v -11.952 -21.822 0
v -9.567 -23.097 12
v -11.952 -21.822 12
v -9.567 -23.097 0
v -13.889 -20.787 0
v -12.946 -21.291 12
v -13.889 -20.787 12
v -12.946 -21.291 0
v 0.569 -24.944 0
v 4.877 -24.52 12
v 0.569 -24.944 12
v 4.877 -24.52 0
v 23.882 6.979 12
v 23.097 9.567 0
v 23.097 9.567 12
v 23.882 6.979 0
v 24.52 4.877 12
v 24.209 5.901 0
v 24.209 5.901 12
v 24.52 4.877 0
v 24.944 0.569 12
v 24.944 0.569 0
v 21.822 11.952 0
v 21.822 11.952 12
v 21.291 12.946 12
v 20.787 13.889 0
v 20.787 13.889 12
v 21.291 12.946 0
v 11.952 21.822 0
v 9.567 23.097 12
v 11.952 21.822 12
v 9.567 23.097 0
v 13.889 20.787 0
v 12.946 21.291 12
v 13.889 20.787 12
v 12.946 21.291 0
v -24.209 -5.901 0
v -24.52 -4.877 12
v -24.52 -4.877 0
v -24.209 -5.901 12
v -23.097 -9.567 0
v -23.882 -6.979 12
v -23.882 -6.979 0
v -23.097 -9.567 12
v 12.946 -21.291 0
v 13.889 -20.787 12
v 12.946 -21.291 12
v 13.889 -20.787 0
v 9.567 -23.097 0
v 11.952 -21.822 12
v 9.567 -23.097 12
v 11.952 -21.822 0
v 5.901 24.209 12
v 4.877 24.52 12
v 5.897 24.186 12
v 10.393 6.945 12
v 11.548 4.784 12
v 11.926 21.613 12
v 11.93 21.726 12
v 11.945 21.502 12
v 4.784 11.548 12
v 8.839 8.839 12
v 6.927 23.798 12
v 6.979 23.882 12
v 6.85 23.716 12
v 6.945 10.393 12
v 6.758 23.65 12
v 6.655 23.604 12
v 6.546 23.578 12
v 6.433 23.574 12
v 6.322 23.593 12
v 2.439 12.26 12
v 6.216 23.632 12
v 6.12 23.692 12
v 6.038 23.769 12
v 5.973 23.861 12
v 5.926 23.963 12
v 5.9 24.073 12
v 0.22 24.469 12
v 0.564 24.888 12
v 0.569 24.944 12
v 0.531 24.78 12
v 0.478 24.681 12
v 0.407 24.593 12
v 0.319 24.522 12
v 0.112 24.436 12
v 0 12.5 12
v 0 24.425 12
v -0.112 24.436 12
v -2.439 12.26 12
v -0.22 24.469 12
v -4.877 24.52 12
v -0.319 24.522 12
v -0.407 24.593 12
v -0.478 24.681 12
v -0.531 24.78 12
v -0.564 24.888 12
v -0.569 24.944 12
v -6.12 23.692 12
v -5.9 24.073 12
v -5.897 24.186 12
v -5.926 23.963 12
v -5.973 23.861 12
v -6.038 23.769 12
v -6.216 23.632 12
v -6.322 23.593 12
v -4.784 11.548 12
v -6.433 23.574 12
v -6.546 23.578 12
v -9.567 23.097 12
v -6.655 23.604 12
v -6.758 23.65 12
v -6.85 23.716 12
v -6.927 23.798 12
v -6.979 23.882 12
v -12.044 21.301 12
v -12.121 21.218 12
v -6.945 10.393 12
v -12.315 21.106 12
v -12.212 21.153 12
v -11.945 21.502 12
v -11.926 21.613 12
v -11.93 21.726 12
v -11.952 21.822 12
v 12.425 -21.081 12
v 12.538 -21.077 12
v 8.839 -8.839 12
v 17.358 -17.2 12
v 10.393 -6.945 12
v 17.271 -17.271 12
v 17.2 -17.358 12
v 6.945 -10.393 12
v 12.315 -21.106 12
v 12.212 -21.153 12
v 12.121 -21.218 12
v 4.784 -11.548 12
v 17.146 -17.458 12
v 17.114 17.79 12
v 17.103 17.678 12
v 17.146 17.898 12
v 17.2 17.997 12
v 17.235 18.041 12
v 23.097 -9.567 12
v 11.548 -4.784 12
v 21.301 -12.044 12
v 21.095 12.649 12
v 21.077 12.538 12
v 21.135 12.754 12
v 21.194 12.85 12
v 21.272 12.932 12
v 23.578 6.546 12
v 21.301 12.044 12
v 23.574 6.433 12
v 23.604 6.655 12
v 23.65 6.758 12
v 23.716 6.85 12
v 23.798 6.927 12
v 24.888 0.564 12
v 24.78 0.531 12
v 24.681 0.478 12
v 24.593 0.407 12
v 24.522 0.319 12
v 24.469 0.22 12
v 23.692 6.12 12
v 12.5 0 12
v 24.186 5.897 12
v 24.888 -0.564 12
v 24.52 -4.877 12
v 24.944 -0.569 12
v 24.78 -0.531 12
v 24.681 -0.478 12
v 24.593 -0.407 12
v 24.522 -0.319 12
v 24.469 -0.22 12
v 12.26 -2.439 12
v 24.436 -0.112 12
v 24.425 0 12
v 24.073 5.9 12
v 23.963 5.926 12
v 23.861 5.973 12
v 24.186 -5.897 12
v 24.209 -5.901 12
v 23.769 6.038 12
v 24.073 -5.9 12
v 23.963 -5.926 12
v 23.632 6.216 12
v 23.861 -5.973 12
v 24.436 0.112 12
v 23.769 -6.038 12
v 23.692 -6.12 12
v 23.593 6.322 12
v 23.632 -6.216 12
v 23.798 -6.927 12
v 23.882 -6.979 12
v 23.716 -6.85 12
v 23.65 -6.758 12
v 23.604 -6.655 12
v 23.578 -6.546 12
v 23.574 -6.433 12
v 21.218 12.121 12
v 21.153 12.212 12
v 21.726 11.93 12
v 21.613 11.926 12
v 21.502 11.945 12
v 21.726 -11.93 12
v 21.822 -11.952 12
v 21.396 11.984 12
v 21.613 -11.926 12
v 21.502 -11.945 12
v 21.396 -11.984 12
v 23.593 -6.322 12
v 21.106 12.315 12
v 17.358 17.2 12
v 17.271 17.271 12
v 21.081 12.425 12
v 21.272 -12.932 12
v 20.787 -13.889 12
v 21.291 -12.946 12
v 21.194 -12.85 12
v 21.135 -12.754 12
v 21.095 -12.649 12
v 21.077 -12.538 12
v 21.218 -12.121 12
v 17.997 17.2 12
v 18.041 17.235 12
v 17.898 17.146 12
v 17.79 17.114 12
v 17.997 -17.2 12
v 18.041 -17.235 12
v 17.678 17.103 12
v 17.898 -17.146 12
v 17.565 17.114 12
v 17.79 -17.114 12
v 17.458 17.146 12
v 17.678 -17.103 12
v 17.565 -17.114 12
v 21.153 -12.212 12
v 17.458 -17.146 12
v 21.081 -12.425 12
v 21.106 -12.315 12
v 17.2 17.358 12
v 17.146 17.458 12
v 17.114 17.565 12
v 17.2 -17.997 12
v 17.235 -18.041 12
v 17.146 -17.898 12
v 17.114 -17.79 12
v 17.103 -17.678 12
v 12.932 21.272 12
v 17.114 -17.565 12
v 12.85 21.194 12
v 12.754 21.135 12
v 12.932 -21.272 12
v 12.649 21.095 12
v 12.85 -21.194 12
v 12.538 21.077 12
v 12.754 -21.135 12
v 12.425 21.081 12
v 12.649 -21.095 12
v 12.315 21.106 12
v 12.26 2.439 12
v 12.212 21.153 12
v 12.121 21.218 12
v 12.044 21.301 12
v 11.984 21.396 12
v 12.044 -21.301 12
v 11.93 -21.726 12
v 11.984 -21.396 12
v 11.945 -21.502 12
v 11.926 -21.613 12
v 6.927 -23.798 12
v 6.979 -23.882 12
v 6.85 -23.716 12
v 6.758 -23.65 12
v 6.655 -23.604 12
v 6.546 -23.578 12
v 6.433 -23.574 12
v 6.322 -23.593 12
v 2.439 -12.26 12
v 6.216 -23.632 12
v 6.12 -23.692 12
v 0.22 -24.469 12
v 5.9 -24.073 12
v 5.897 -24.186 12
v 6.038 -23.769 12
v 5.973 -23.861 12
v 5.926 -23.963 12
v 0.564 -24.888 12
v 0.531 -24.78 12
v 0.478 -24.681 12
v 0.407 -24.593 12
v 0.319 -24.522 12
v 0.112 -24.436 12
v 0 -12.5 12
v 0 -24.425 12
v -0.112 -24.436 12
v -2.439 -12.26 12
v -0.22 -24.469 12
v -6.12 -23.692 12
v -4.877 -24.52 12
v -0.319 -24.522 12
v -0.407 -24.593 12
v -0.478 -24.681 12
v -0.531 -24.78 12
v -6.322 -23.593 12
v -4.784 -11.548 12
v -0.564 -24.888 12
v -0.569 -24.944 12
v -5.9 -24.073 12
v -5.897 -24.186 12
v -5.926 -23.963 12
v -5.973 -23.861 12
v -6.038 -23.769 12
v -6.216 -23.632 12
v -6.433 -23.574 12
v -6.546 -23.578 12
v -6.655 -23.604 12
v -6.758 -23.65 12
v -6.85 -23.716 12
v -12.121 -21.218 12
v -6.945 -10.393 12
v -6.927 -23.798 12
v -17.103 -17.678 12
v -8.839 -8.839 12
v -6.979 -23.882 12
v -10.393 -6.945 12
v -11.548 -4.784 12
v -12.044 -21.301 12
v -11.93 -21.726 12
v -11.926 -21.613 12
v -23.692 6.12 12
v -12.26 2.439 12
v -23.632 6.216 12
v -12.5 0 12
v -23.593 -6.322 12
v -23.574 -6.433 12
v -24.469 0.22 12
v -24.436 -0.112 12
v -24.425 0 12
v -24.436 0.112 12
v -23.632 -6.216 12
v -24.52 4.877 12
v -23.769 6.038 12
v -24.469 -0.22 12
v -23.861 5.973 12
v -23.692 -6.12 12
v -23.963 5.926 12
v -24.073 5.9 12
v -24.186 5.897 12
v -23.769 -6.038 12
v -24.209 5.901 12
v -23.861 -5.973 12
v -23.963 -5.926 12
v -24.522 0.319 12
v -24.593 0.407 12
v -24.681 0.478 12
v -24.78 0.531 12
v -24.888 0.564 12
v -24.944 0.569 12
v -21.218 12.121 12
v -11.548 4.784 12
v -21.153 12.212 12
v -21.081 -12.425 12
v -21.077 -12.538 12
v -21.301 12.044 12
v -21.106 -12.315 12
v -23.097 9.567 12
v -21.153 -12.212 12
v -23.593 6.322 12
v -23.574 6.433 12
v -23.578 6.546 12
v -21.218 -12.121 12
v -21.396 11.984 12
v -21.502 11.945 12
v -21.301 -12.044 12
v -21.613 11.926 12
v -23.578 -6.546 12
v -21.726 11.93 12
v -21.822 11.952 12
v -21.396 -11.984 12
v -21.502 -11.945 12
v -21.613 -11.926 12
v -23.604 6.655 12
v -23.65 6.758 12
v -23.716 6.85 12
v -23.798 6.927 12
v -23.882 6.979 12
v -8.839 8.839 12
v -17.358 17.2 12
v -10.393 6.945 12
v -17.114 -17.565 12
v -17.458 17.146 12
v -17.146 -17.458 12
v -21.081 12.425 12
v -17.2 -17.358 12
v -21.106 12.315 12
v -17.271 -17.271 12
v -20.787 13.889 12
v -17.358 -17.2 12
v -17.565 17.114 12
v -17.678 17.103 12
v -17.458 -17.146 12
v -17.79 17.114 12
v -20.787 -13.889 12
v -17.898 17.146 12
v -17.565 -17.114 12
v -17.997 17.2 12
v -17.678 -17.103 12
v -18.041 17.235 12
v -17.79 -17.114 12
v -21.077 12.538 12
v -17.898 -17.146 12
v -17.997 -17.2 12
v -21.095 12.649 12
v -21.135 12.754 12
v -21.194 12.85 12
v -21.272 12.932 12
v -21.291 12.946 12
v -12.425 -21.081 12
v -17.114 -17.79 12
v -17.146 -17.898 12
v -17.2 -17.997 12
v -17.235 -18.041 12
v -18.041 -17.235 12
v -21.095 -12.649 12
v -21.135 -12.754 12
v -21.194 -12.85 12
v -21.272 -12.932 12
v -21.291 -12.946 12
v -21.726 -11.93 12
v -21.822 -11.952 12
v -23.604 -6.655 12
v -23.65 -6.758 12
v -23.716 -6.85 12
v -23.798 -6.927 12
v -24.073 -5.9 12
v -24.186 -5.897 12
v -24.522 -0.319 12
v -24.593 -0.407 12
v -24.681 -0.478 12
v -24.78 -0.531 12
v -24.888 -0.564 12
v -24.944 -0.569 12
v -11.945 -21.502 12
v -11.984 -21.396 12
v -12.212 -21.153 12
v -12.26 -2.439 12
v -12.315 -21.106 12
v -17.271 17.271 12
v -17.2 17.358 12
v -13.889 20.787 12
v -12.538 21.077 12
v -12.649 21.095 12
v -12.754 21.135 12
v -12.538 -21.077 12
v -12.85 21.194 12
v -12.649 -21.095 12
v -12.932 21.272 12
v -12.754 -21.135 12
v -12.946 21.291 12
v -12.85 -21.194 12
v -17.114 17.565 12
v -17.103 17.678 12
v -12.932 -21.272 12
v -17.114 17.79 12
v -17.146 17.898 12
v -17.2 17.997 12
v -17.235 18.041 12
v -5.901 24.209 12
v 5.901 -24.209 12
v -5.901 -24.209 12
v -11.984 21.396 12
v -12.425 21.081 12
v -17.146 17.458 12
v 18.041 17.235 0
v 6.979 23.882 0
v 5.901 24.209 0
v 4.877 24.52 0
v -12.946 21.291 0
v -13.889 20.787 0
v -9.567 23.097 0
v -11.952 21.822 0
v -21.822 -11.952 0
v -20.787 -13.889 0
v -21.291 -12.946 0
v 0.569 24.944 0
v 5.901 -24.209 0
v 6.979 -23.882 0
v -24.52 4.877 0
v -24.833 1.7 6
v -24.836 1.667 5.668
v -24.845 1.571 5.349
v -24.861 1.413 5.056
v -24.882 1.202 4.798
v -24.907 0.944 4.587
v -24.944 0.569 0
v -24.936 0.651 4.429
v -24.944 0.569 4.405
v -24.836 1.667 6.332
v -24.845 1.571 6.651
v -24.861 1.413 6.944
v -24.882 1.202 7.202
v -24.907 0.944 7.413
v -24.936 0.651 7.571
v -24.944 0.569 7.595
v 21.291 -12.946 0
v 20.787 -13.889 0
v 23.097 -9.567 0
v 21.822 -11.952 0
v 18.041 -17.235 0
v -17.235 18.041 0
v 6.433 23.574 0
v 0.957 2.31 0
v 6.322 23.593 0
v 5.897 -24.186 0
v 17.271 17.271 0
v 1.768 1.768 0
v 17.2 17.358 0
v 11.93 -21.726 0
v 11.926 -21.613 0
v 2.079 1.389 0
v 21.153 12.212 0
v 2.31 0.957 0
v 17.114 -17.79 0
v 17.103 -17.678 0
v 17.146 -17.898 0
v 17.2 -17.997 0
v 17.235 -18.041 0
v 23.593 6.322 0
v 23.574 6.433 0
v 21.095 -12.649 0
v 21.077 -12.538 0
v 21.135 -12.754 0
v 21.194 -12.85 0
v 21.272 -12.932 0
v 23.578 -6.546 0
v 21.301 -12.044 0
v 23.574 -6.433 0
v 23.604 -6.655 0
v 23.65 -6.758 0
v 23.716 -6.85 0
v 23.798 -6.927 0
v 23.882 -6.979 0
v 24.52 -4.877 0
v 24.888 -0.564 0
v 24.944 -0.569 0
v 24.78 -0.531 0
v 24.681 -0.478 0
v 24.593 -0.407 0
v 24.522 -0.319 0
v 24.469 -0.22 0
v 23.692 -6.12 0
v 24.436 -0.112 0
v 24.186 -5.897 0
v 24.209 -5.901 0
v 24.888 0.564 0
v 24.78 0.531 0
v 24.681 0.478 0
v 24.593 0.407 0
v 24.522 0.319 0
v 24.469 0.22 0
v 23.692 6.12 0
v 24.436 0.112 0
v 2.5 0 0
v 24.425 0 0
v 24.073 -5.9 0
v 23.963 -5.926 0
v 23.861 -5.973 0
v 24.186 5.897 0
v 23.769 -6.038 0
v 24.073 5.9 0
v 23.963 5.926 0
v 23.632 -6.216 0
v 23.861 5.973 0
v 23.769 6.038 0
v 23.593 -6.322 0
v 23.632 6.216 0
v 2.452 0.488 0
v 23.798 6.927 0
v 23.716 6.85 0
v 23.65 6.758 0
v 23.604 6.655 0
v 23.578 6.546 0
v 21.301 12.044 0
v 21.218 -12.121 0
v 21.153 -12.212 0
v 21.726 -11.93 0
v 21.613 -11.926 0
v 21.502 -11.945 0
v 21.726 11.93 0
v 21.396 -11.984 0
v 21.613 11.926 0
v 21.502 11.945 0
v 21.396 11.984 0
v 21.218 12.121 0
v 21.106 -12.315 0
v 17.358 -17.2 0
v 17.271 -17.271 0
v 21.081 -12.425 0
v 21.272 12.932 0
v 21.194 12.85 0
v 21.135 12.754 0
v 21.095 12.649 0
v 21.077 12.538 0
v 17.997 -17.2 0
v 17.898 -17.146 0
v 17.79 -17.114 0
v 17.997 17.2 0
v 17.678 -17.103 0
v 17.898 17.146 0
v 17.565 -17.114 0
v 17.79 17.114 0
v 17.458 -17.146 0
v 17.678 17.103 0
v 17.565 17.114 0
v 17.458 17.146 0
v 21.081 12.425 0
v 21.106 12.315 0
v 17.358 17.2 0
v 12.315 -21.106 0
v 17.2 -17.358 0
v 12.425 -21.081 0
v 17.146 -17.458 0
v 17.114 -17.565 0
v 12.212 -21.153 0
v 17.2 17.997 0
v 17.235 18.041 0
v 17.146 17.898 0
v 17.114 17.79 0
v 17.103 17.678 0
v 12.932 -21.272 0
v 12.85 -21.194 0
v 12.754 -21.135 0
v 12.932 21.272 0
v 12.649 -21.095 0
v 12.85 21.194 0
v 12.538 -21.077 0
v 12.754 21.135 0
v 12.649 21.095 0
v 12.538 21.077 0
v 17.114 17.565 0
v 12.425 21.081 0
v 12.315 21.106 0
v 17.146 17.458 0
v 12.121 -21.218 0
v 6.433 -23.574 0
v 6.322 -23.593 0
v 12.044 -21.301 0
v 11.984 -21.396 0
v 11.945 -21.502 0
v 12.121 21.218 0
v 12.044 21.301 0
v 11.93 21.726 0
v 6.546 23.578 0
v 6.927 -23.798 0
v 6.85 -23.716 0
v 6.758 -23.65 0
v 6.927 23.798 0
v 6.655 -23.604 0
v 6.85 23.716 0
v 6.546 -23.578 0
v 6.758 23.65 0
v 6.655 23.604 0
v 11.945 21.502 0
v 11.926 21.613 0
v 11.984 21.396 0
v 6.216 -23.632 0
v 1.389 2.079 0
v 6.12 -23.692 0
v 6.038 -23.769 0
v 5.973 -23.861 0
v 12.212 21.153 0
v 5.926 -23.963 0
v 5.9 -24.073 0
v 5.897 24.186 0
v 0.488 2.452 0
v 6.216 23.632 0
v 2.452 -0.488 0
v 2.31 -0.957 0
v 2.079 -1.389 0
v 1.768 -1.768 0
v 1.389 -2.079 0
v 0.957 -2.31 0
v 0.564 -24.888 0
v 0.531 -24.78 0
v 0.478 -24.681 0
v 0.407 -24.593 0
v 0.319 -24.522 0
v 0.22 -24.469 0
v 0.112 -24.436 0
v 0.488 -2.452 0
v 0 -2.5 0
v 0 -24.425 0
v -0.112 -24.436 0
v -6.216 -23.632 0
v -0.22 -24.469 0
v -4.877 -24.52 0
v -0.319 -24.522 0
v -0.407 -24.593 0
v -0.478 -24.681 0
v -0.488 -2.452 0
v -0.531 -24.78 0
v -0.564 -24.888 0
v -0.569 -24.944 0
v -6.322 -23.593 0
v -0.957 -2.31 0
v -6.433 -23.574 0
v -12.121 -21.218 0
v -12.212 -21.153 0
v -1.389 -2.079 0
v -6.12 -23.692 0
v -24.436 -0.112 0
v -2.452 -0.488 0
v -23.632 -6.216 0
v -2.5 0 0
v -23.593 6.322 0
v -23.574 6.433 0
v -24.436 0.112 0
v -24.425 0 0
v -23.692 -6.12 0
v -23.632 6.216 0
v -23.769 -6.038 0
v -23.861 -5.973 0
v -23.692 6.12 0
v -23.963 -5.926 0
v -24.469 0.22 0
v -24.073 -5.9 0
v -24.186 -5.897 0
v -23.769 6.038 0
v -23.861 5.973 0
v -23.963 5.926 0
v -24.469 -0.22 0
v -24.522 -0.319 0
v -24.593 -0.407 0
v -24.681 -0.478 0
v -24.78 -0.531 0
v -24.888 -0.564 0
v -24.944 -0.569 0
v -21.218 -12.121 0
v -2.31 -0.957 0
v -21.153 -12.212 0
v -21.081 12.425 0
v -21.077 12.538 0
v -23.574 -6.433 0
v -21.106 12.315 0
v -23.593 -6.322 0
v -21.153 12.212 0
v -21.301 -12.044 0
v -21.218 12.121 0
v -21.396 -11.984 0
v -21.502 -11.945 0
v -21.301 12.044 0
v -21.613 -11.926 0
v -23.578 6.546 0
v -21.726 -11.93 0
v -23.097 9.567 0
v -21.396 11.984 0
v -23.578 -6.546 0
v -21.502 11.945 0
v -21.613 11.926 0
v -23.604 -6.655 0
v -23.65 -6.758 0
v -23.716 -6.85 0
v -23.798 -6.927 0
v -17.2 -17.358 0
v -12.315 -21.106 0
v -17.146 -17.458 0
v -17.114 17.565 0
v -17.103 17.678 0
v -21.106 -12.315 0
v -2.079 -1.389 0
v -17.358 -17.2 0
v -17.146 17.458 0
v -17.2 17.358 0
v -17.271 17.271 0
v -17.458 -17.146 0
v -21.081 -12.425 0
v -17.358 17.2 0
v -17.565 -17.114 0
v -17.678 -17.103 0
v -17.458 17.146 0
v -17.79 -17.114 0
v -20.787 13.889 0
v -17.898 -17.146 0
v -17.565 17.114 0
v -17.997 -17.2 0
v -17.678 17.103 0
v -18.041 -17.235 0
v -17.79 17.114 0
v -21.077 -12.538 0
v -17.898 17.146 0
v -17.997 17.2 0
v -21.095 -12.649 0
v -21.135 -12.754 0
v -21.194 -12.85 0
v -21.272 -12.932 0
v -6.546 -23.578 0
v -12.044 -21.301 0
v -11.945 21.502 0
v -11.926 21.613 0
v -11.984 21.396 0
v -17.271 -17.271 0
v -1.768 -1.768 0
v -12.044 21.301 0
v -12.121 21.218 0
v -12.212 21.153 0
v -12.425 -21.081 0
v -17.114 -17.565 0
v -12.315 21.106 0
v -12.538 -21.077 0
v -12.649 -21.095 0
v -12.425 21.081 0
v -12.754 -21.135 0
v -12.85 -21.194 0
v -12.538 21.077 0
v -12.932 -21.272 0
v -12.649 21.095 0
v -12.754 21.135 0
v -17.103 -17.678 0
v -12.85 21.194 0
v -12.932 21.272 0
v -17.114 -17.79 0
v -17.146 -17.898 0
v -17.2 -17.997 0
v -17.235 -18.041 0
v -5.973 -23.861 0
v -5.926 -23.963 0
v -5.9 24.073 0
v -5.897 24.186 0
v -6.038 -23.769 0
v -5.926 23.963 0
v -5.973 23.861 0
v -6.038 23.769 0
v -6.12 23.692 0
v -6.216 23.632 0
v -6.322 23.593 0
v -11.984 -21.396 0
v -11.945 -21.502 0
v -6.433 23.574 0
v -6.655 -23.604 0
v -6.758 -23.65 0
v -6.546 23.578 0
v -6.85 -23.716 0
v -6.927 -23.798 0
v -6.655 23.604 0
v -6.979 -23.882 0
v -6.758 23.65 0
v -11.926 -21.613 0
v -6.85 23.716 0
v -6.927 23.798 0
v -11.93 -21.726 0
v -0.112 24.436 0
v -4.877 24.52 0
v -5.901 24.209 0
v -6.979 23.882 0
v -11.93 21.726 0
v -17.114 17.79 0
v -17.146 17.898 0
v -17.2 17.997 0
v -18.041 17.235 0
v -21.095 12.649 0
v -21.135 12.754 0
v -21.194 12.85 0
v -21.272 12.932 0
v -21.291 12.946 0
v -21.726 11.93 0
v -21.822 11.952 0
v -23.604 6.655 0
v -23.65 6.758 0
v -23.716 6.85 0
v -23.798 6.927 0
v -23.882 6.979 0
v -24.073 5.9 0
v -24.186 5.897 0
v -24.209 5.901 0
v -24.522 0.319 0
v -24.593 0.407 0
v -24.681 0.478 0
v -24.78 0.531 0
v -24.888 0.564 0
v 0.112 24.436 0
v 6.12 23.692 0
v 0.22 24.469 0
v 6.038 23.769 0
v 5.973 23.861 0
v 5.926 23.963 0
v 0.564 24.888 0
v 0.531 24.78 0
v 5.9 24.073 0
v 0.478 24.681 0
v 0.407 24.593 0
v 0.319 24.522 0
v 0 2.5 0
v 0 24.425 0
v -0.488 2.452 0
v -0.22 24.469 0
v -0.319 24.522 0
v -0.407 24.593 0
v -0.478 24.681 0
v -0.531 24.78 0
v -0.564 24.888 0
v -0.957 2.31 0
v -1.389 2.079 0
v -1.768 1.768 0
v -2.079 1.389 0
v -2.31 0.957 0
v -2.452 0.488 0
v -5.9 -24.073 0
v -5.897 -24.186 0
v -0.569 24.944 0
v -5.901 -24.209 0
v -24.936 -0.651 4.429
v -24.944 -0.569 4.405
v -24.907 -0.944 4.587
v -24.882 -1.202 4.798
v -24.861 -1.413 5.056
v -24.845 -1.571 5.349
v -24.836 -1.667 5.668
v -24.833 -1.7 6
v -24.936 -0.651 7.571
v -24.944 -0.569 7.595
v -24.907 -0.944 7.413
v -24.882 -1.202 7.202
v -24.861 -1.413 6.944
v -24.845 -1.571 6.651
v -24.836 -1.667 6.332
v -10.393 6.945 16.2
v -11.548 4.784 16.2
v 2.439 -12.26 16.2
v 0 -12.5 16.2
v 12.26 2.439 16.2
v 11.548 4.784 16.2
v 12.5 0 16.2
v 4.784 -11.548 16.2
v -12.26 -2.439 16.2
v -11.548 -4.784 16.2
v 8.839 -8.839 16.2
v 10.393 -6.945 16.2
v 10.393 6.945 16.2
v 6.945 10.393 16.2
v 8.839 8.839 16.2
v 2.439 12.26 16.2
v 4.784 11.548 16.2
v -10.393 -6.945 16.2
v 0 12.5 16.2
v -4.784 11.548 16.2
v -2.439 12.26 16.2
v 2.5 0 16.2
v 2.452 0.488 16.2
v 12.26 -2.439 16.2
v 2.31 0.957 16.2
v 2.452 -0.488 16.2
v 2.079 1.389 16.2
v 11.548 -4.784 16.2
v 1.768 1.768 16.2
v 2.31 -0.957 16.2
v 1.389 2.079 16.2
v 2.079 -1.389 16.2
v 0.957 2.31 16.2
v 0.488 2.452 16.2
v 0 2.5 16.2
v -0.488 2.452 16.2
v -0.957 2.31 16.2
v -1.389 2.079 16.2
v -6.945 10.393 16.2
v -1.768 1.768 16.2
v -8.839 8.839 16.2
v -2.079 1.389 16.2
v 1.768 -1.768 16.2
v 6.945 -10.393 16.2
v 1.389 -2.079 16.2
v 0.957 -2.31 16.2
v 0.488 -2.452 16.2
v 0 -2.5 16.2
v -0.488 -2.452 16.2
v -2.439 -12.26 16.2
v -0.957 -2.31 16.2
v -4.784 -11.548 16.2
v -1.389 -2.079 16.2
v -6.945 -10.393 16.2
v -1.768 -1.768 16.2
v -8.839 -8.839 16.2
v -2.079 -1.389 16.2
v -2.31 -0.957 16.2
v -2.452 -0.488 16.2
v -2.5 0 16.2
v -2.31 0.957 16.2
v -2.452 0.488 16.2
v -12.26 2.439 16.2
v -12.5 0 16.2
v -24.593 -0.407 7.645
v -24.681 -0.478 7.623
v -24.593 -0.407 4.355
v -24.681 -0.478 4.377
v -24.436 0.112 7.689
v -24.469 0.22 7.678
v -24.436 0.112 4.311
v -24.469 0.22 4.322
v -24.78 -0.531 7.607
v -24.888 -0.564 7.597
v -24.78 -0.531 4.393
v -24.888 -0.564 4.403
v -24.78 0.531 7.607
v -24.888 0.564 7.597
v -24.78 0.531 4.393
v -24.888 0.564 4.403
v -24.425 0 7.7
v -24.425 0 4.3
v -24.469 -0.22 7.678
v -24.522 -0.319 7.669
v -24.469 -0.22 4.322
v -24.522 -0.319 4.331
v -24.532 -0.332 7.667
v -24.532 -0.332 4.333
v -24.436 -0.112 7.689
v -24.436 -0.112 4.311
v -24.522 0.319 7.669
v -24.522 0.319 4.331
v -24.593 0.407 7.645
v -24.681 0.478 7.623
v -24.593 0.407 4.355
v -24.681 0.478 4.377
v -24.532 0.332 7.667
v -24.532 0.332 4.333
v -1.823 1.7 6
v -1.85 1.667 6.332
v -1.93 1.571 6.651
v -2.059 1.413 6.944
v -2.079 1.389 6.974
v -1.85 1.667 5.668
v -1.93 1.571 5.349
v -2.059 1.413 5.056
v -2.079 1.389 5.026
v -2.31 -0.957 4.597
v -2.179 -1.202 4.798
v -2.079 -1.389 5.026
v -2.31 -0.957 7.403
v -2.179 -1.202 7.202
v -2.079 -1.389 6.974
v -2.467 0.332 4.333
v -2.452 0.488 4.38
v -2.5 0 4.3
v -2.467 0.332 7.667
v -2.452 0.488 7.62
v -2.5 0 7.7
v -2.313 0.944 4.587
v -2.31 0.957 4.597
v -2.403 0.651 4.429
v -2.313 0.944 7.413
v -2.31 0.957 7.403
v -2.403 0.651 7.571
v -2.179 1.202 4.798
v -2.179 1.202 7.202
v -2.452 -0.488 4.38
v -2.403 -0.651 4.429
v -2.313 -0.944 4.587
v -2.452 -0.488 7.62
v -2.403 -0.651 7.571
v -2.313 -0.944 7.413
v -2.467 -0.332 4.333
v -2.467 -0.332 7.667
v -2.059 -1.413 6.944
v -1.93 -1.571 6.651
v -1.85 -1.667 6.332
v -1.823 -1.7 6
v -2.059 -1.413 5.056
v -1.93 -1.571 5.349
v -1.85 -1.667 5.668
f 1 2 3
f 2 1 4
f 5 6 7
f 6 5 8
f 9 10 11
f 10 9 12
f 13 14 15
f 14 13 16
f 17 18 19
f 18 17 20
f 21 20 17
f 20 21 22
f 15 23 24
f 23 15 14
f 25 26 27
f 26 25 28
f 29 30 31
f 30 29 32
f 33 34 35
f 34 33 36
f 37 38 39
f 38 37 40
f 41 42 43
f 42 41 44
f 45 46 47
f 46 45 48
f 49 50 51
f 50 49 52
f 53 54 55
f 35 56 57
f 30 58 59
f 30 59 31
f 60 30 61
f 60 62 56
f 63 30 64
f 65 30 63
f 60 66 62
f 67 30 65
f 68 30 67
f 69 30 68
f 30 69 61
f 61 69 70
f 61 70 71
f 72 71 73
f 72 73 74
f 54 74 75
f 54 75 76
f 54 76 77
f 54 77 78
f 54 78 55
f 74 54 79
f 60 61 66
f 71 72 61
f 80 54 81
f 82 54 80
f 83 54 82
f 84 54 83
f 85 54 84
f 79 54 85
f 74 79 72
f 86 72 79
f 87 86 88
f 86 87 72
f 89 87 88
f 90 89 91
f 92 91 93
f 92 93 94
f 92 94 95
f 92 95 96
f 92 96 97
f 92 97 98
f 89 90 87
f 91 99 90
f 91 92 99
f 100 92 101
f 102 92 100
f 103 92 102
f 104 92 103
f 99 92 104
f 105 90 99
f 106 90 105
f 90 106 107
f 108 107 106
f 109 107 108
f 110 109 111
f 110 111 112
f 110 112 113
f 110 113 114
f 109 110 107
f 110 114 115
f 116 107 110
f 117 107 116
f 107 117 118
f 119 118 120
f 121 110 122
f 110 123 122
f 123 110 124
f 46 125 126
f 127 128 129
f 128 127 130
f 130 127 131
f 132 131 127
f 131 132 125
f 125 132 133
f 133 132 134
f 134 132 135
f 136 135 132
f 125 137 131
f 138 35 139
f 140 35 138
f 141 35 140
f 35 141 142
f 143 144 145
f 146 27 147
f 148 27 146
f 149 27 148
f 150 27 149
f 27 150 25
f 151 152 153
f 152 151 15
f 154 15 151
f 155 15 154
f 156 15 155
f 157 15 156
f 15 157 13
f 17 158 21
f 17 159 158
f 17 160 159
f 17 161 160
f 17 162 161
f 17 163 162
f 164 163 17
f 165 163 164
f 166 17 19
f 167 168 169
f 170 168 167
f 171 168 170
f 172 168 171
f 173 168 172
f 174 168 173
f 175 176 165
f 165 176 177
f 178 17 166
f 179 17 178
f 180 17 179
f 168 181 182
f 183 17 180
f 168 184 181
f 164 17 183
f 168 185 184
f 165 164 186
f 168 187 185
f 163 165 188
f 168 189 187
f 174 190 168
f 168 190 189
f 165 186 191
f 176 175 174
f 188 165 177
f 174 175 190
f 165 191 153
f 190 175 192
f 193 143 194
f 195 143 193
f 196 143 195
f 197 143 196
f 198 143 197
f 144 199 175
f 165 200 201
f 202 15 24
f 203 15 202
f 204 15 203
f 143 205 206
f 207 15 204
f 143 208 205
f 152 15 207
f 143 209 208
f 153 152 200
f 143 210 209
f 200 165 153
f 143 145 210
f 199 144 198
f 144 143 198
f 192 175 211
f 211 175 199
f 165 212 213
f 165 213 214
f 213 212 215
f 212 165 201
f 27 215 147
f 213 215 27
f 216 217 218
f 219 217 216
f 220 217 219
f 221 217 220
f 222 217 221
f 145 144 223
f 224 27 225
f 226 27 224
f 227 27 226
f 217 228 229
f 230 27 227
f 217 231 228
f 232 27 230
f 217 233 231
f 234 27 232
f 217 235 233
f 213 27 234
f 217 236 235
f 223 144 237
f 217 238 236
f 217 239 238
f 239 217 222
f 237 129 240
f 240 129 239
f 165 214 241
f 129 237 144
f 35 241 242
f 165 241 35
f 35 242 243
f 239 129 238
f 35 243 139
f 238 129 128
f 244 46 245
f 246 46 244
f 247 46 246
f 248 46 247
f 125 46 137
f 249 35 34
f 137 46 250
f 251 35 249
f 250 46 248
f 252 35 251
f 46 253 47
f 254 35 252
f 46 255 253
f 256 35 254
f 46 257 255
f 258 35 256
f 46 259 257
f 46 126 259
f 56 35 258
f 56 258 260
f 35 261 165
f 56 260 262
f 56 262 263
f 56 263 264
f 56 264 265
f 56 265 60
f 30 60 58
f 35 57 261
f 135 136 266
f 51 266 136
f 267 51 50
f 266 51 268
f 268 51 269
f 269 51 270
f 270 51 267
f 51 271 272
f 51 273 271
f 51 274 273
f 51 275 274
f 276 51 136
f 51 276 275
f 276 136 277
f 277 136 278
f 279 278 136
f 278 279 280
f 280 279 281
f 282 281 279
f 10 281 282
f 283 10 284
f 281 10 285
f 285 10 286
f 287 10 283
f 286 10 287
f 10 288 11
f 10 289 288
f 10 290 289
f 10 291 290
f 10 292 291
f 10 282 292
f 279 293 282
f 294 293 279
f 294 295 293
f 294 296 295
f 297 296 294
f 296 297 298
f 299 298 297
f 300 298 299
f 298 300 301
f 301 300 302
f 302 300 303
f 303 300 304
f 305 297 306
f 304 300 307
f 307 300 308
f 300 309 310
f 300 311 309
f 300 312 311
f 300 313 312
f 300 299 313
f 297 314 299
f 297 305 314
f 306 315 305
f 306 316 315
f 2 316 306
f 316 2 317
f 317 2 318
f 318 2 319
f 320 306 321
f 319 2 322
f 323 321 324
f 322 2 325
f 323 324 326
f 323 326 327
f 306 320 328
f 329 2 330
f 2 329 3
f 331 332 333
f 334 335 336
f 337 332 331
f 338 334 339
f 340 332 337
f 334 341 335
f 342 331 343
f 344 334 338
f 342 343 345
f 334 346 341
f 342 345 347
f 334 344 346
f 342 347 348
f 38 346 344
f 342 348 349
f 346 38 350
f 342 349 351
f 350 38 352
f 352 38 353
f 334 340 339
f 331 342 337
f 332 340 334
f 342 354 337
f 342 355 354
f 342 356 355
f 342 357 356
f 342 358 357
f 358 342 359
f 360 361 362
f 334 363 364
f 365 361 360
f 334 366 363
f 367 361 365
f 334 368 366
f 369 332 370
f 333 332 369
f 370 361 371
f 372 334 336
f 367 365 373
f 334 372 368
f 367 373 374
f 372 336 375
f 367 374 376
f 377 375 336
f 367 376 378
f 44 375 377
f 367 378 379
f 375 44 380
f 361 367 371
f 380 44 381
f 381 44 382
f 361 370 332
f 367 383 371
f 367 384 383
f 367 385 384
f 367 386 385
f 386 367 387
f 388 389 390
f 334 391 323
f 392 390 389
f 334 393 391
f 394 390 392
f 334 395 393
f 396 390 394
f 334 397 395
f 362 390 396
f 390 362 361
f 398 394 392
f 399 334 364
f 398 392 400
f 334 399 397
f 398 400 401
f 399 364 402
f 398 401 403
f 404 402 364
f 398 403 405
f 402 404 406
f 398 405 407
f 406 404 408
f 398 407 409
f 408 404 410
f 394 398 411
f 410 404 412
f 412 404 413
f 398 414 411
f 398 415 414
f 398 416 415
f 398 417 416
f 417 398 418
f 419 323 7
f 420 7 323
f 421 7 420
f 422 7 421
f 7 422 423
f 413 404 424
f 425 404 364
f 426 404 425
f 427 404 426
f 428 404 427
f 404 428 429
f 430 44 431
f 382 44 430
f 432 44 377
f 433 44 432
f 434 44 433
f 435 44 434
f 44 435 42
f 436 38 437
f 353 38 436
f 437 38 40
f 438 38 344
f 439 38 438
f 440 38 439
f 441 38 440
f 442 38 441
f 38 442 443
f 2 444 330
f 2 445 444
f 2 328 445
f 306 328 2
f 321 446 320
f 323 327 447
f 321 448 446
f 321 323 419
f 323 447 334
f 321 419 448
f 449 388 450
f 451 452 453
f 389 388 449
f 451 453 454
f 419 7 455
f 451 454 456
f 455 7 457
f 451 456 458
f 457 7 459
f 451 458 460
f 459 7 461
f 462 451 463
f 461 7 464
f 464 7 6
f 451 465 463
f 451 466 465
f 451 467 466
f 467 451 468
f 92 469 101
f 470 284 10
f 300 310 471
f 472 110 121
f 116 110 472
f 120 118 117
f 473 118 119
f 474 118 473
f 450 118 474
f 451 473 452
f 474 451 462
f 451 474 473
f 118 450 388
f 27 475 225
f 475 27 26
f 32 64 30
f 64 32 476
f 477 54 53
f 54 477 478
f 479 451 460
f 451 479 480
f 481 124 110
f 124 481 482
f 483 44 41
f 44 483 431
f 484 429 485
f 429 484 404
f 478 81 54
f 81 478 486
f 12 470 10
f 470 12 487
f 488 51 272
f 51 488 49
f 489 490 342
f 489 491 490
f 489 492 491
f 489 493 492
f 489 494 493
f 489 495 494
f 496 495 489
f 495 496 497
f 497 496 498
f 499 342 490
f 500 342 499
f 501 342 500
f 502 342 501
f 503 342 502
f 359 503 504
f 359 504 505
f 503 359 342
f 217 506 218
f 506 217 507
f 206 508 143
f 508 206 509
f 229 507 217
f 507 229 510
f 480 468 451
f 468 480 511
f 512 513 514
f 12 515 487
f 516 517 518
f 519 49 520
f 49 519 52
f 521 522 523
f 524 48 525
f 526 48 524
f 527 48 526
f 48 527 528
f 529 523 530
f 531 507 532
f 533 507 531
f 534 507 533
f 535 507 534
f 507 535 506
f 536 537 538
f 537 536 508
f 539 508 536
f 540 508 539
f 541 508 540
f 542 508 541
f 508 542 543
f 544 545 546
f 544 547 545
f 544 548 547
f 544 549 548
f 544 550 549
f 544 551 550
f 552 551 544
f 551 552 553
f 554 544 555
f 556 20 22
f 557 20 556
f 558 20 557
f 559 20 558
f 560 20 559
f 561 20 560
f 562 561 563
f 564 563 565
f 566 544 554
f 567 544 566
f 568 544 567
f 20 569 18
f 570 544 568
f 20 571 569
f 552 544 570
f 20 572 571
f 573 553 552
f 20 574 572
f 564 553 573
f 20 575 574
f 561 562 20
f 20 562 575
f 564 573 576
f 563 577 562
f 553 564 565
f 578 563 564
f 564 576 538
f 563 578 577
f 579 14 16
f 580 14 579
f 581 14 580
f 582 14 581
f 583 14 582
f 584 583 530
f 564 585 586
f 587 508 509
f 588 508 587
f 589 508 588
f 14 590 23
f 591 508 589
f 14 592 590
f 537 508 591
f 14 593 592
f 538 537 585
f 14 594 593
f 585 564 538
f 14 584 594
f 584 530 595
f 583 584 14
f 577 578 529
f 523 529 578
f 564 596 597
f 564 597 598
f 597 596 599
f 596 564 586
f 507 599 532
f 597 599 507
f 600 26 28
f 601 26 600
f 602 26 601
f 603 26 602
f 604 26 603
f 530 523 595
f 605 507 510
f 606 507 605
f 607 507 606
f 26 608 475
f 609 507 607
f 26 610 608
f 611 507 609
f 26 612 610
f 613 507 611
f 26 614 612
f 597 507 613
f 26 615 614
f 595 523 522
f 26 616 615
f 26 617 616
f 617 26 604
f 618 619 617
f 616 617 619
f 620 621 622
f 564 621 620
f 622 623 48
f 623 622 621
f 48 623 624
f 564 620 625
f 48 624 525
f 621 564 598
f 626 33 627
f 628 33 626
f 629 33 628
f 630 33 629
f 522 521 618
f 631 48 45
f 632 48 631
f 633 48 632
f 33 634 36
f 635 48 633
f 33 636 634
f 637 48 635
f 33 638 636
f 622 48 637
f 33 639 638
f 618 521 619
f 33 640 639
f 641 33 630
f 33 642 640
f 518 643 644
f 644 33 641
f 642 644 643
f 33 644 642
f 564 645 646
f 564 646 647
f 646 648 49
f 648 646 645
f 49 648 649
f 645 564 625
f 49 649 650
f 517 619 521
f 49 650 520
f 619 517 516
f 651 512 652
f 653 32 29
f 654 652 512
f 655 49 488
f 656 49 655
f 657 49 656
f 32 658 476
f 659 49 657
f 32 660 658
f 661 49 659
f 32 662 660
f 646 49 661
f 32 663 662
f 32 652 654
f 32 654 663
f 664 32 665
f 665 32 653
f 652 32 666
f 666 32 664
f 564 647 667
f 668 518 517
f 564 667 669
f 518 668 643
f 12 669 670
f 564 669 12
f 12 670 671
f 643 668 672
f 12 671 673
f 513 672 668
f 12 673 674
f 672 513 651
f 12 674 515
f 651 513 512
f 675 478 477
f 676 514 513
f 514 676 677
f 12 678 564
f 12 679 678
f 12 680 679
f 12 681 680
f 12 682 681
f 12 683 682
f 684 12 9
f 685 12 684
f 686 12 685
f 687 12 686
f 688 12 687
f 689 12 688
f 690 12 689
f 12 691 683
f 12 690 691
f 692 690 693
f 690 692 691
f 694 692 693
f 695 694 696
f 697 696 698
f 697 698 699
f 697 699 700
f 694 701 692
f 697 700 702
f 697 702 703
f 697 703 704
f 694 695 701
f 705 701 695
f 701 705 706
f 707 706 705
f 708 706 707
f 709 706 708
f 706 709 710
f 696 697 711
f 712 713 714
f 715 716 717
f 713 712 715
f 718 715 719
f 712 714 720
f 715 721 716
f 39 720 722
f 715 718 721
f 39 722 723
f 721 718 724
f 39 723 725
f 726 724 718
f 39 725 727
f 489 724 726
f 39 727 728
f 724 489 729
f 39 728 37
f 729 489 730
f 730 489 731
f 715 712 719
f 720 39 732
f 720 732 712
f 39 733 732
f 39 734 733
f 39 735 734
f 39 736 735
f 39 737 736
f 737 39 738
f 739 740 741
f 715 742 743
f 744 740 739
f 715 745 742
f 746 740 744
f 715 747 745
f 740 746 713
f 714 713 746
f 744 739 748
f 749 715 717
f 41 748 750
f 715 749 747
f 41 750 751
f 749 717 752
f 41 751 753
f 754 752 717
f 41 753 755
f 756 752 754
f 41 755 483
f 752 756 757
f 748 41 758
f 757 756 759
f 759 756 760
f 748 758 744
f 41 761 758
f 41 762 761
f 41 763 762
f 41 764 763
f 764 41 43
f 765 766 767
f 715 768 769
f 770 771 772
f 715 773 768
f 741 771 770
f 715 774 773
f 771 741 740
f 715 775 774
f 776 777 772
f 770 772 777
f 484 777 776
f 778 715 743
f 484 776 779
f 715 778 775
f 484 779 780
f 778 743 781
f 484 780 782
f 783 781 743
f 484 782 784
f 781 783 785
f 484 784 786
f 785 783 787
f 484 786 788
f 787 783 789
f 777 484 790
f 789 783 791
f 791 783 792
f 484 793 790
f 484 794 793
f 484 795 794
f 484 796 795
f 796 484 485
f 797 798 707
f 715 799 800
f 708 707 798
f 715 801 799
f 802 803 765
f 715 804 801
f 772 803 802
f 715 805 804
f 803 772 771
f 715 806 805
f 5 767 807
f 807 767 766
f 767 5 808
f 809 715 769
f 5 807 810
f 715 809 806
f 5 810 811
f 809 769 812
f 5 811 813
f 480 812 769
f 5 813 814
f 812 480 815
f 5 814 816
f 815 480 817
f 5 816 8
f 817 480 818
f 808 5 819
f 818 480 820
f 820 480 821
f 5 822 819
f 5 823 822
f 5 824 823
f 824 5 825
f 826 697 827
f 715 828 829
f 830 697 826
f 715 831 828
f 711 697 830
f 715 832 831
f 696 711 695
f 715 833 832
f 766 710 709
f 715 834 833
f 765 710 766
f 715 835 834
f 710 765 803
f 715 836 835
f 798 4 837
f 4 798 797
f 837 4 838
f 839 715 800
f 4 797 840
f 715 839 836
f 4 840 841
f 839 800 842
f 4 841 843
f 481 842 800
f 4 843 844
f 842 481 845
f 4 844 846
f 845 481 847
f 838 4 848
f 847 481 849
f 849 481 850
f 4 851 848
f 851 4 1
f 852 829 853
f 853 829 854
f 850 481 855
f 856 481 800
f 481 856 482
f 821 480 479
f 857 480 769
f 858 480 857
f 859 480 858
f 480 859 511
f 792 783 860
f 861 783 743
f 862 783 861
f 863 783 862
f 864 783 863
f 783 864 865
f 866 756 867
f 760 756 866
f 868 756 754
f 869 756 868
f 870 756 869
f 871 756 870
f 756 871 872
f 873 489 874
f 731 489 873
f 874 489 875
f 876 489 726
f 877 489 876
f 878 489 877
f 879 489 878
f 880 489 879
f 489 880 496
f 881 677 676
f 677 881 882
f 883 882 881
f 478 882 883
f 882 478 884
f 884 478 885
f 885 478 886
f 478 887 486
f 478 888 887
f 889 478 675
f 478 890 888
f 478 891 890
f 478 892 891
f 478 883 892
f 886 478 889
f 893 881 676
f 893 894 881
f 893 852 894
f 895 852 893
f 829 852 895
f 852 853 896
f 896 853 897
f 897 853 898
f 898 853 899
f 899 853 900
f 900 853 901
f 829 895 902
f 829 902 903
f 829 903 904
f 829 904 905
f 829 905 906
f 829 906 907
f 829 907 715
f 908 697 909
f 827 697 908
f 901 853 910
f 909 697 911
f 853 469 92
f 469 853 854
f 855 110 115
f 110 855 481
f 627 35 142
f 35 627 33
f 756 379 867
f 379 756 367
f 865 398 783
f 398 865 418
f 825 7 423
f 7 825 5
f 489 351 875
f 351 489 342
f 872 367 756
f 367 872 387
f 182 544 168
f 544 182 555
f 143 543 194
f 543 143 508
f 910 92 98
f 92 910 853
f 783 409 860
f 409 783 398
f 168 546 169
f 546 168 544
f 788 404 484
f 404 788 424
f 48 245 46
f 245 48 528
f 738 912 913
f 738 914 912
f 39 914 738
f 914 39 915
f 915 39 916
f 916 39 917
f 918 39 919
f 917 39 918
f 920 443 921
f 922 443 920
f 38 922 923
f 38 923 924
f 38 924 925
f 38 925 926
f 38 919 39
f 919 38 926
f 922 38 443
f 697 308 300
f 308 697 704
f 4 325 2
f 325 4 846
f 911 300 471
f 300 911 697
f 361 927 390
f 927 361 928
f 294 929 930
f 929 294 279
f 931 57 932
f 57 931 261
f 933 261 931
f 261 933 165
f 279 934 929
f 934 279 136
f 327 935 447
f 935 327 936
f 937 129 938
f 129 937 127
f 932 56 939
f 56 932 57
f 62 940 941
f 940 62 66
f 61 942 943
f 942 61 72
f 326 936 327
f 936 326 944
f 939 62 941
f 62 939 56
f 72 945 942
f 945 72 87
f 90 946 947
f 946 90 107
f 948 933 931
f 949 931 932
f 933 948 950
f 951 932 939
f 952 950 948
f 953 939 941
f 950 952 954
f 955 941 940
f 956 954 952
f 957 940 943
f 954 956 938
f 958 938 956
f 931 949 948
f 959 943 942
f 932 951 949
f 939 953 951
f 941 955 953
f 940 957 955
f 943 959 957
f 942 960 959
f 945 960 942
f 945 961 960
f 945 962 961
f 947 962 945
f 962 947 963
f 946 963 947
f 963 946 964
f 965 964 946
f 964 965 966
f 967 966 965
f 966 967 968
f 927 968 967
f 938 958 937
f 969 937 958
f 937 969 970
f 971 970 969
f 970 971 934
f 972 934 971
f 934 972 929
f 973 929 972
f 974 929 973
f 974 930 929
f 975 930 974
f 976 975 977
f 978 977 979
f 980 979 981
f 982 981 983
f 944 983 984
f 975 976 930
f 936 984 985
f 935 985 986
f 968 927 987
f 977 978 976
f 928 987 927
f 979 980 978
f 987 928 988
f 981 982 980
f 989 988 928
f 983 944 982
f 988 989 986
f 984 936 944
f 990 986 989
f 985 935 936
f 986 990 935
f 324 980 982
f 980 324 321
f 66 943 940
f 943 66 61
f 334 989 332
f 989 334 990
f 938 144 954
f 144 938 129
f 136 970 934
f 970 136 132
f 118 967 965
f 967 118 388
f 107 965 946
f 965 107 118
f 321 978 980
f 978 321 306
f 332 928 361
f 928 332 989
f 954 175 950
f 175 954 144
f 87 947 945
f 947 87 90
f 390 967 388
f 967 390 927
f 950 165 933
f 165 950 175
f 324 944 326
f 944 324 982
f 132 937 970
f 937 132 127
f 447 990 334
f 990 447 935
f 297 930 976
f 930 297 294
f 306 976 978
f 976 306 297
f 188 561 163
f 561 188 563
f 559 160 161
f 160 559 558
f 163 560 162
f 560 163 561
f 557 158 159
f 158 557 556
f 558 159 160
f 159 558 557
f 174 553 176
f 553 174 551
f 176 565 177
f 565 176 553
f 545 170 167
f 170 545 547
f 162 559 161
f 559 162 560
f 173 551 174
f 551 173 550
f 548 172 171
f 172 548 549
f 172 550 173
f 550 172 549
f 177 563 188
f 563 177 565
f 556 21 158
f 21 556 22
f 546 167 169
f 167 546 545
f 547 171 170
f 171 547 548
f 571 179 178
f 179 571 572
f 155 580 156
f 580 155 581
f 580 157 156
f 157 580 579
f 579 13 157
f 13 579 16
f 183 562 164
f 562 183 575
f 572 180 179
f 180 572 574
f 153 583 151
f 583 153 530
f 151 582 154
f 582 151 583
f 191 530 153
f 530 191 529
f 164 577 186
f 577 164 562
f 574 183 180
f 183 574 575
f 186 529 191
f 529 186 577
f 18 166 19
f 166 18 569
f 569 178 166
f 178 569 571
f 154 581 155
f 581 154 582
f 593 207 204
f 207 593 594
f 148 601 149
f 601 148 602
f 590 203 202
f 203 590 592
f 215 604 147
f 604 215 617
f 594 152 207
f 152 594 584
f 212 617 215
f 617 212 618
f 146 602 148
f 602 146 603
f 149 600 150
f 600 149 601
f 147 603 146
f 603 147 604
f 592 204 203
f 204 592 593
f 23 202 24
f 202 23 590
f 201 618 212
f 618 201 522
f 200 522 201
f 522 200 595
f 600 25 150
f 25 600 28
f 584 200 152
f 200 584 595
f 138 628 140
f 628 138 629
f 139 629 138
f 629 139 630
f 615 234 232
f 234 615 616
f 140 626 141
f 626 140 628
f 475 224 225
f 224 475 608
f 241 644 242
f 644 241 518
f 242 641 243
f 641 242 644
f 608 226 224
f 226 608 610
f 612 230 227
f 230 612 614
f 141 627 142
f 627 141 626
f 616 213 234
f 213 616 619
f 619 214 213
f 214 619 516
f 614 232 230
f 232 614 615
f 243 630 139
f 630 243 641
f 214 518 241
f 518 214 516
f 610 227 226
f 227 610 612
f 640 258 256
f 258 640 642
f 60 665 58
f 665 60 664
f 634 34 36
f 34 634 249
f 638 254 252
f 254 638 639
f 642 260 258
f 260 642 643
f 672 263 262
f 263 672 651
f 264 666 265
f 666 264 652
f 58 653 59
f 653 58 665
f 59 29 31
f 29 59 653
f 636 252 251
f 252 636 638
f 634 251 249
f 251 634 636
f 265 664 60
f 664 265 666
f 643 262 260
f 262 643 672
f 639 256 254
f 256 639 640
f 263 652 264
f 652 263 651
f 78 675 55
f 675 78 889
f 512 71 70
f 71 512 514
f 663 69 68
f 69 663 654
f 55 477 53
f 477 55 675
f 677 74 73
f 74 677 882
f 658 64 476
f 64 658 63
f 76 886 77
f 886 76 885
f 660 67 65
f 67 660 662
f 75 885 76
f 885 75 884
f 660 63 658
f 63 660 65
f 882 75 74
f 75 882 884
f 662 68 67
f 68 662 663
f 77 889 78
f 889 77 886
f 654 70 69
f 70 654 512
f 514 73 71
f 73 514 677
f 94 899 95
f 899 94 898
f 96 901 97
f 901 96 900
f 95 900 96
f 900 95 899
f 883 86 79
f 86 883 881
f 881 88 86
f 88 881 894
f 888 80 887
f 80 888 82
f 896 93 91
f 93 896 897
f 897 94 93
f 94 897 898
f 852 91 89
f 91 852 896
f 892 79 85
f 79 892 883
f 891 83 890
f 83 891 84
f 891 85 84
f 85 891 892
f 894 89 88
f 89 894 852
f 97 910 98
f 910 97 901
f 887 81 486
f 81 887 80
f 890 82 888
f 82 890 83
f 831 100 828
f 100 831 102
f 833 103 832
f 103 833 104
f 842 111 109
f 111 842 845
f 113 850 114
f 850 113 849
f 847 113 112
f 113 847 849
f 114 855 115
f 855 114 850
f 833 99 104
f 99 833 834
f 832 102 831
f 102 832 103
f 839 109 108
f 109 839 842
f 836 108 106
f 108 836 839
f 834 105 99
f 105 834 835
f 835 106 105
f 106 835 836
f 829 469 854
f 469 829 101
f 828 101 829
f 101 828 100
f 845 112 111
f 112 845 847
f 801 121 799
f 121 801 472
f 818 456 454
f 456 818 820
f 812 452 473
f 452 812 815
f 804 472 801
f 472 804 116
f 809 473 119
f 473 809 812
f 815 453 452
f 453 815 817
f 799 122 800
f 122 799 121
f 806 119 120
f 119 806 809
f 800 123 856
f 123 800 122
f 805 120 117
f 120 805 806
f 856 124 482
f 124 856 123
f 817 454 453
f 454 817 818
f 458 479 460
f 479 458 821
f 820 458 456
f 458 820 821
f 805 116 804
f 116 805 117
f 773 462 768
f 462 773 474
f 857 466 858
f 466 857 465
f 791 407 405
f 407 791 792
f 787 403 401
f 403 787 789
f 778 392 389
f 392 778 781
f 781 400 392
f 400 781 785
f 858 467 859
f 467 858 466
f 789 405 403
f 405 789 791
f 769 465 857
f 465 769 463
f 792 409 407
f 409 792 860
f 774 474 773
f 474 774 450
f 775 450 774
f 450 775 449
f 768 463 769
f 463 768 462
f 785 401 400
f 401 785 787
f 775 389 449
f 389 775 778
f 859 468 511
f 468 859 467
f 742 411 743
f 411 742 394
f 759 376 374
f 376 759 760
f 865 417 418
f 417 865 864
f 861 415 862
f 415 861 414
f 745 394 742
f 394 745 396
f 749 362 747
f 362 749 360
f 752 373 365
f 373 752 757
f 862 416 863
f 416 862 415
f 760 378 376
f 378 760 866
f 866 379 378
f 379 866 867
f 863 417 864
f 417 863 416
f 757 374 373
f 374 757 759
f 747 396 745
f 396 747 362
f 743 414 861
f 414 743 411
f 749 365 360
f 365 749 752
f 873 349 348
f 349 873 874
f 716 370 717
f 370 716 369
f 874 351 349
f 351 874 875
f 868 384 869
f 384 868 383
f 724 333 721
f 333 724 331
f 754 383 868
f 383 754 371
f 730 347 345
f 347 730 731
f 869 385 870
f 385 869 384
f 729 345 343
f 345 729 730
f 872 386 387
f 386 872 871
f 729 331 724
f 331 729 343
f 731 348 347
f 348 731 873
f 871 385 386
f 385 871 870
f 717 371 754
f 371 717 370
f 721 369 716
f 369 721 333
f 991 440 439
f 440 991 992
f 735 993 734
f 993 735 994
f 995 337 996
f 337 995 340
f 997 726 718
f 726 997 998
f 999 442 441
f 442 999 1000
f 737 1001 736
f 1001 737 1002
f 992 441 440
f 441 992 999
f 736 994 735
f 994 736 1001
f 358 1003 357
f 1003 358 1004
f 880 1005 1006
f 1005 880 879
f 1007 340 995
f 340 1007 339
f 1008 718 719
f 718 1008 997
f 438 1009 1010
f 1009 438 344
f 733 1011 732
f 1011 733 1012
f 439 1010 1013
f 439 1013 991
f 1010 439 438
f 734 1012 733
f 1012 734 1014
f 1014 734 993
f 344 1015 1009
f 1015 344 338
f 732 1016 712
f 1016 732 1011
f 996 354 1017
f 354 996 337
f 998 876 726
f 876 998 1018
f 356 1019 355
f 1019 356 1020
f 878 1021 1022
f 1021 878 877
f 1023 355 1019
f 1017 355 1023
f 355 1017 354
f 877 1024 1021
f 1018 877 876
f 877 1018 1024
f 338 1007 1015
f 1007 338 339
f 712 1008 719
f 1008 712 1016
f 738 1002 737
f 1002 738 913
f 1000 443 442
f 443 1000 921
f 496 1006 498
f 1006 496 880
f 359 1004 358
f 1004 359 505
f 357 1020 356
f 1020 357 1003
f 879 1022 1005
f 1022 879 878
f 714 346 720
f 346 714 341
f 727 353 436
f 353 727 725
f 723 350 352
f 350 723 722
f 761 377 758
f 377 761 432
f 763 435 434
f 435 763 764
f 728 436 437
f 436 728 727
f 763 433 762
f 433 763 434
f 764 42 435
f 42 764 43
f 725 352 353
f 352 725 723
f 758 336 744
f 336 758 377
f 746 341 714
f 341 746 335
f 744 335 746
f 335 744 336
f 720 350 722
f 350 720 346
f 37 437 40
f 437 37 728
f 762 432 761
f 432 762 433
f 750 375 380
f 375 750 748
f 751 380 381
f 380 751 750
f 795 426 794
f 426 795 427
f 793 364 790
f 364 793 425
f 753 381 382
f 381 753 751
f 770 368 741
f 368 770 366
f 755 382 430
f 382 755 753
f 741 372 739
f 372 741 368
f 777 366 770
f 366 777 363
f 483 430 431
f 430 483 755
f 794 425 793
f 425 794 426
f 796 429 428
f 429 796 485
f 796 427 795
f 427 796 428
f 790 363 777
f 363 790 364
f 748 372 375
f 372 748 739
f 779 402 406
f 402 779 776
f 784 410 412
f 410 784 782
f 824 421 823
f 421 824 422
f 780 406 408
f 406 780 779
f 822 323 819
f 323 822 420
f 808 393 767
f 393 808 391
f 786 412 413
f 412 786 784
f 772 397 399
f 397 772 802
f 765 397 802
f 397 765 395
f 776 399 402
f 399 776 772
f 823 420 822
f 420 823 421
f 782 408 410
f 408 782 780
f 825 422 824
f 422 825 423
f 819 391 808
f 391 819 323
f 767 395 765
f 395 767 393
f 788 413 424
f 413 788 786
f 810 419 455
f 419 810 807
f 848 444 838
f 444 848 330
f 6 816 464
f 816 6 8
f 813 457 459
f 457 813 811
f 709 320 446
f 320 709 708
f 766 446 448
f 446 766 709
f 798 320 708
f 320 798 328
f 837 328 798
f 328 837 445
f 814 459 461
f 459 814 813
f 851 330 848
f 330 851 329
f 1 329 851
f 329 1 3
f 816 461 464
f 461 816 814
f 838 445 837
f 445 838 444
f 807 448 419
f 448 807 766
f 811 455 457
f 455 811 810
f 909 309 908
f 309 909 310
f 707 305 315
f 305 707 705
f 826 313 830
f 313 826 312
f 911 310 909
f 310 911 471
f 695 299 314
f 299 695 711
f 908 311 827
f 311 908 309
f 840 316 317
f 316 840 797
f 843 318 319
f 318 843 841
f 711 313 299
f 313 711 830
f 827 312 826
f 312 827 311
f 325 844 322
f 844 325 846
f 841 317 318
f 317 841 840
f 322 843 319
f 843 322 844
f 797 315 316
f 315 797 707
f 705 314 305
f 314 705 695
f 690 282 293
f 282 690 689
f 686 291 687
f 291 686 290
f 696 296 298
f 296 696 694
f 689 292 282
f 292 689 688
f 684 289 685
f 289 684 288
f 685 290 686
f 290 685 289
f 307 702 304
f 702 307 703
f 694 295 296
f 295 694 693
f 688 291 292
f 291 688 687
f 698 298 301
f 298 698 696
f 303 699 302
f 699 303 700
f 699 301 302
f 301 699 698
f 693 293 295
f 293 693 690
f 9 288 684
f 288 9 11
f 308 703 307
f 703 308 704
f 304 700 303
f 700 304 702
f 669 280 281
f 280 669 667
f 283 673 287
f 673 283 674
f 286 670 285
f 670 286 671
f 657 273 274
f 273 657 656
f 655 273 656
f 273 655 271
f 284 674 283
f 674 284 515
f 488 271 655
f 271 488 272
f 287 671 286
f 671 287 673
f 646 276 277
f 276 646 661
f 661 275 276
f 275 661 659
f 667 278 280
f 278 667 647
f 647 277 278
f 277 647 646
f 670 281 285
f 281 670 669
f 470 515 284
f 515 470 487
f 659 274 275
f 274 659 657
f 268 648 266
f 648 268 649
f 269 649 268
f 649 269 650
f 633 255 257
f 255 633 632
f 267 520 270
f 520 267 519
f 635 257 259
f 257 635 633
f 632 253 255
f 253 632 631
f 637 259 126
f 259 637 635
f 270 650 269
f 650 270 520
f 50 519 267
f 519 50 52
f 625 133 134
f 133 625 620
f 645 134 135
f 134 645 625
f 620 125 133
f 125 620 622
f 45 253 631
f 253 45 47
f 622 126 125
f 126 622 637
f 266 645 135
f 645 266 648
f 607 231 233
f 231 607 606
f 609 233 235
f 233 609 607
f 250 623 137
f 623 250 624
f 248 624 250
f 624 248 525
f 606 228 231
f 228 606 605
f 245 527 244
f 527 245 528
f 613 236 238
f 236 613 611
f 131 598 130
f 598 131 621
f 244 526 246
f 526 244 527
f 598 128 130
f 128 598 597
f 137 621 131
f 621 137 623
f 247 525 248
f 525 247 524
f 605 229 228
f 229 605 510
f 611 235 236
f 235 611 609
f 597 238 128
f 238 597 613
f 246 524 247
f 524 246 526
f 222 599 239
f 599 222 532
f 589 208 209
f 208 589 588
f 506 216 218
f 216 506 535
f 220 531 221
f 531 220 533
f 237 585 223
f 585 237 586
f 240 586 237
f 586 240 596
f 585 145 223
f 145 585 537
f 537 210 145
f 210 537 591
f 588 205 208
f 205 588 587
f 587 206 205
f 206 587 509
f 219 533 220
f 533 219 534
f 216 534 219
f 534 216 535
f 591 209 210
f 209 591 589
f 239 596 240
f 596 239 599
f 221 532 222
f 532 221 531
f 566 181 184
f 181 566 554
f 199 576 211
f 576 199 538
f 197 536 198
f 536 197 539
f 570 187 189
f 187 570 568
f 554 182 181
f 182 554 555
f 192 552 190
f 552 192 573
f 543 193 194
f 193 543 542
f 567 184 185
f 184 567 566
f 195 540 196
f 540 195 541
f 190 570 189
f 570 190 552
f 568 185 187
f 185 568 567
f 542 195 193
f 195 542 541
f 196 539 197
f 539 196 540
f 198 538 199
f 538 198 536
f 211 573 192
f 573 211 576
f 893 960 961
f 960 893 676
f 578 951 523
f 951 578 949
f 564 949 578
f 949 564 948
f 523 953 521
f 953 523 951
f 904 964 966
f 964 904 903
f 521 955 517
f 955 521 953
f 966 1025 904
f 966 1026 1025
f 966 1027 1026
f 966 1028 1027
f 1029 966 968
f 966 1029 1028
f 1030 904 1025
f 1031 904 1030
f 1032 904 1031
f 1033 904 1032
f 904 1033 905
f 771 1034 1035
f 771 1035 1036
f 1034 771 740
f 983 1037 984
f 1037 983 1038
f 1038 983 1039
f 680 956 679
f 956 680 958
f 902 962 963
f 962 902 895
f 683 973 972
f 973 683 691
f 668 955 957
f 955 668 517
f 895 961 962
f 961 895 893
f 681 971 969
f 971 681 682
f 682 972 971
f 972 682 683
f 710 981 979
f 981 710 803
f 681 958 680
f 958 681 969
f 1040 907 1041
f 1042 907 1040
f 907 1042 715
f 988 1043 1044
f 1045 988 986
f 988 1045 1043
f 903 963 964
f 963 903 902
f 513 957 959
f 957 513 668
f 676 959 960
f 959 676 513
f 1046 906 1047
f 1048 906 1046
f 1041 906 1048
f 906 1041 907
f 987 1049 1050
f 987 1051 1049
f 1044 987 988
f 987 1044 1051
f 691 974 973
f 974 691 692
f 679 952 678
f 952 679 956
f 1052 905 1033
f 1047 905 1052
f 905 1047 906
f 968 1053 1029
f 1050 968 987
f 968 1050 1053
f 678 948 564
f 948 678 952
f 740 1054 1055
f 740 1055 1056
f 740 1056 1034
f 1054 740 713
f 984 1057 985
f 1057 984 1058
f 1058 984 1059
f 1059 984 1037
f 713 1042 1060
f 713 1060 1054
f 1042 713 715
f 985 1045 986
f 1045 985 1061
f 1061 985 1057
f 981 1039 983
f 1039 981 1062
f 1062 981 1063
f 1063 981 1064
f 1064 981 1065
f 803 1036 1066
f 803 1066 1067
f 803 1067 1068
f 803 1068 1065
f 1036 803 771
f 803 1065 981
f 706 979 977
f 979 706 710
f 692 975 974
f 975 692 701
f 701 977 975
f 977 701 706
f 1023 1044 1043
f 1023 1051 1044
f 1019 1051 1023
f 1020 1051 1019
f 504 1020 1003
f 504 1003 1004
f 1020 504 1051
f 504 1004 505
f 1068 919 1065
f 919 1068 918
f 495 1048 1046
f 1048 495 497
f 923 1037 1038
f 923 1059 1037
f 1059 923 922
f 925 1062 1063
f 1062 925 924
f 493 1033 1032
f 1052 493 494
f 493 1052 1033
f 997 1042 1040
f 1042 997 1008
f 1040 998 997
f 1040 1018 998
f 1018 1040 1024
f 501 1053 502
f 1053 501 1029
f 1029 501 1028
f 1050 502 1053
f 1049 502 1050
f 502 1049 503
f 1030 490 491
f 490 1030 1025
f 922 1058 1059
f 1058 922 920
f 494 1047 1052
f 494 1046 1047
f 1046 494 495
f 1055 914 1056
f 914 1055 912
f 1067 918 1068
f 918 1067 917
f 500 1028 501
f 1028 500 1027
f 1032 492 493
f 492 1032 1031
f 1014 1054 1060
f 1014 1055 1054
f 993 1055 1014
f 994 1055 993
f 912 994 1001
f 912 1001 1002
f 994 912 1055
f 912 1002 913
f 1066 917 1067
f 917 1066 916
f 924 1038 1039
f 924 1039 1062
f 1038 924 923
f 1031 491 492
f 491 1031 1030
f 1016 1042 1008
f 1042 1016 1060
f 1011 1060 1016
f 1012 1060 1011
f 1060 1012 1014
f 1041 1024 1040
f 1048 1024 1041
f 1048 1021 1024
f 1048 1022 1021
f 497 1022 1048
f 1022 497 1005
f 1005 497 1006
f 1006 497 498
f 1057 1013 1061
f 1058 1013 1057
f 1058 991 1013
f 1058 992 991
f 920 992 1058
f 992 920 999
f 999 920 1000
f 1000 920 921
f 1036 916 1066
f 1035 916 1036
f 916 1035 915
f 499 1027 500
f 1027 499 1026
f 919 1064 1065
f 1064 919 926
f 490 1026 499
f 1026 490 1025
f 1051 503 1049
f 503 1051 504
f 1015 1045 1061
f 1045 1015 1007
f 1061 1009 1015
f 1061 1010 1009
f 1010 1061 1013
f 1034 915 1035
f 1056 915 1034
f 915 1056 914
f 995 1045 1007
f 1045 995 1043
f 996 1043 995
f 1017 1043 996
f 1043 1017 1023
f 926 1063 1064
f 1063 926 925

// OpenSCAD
$fn = 32;

// ----------------------------------------------------------------------
// Hand knob: 50 x 50 x 16.2 mm
// ----------------------------------------------------------------------

// --- parameters (mm) ---
head_d = 50;              // knob diameter
head_h = 12;              // knob height
hole_d = 5;               // shaft bore
set_d = 3.4;              // set screw tap hole
notch_d = 1.15;           // knurl groove diameter
knurl_n = 24;             // number of knurl grooves
cap_h = 4.2;              // raised centre cap
cap_d = 25;               // centre cap diameter

module body() {
  cylinder(h = head_h, d = head_d);
}

module cap() {
  translate([0, 0, head_h - 1]) cylinder(h = cap_h + 1, d = cap_d);
}

difference() {
  union() {
    body();
    cap();
  }
  translate([0, 0, -1]) cylinder(h = head_h + cap_h + 2, d = hole_d);
  /* knurl grooves */
  for (i = [0 : knurl_n - 1])
    rotate([0, 0, i * 360 / knurl_n])
      translate([head_d / 2, 0, -0.5])
        cylinder(h = head_h + 1, d = notch_d);
  translate([-head_d / 2 - 1, 0, head_h * 0.5]) rotate([0, 90, 0]) cylinder(h = head_d / 2 + 2, d = set_d);
}
